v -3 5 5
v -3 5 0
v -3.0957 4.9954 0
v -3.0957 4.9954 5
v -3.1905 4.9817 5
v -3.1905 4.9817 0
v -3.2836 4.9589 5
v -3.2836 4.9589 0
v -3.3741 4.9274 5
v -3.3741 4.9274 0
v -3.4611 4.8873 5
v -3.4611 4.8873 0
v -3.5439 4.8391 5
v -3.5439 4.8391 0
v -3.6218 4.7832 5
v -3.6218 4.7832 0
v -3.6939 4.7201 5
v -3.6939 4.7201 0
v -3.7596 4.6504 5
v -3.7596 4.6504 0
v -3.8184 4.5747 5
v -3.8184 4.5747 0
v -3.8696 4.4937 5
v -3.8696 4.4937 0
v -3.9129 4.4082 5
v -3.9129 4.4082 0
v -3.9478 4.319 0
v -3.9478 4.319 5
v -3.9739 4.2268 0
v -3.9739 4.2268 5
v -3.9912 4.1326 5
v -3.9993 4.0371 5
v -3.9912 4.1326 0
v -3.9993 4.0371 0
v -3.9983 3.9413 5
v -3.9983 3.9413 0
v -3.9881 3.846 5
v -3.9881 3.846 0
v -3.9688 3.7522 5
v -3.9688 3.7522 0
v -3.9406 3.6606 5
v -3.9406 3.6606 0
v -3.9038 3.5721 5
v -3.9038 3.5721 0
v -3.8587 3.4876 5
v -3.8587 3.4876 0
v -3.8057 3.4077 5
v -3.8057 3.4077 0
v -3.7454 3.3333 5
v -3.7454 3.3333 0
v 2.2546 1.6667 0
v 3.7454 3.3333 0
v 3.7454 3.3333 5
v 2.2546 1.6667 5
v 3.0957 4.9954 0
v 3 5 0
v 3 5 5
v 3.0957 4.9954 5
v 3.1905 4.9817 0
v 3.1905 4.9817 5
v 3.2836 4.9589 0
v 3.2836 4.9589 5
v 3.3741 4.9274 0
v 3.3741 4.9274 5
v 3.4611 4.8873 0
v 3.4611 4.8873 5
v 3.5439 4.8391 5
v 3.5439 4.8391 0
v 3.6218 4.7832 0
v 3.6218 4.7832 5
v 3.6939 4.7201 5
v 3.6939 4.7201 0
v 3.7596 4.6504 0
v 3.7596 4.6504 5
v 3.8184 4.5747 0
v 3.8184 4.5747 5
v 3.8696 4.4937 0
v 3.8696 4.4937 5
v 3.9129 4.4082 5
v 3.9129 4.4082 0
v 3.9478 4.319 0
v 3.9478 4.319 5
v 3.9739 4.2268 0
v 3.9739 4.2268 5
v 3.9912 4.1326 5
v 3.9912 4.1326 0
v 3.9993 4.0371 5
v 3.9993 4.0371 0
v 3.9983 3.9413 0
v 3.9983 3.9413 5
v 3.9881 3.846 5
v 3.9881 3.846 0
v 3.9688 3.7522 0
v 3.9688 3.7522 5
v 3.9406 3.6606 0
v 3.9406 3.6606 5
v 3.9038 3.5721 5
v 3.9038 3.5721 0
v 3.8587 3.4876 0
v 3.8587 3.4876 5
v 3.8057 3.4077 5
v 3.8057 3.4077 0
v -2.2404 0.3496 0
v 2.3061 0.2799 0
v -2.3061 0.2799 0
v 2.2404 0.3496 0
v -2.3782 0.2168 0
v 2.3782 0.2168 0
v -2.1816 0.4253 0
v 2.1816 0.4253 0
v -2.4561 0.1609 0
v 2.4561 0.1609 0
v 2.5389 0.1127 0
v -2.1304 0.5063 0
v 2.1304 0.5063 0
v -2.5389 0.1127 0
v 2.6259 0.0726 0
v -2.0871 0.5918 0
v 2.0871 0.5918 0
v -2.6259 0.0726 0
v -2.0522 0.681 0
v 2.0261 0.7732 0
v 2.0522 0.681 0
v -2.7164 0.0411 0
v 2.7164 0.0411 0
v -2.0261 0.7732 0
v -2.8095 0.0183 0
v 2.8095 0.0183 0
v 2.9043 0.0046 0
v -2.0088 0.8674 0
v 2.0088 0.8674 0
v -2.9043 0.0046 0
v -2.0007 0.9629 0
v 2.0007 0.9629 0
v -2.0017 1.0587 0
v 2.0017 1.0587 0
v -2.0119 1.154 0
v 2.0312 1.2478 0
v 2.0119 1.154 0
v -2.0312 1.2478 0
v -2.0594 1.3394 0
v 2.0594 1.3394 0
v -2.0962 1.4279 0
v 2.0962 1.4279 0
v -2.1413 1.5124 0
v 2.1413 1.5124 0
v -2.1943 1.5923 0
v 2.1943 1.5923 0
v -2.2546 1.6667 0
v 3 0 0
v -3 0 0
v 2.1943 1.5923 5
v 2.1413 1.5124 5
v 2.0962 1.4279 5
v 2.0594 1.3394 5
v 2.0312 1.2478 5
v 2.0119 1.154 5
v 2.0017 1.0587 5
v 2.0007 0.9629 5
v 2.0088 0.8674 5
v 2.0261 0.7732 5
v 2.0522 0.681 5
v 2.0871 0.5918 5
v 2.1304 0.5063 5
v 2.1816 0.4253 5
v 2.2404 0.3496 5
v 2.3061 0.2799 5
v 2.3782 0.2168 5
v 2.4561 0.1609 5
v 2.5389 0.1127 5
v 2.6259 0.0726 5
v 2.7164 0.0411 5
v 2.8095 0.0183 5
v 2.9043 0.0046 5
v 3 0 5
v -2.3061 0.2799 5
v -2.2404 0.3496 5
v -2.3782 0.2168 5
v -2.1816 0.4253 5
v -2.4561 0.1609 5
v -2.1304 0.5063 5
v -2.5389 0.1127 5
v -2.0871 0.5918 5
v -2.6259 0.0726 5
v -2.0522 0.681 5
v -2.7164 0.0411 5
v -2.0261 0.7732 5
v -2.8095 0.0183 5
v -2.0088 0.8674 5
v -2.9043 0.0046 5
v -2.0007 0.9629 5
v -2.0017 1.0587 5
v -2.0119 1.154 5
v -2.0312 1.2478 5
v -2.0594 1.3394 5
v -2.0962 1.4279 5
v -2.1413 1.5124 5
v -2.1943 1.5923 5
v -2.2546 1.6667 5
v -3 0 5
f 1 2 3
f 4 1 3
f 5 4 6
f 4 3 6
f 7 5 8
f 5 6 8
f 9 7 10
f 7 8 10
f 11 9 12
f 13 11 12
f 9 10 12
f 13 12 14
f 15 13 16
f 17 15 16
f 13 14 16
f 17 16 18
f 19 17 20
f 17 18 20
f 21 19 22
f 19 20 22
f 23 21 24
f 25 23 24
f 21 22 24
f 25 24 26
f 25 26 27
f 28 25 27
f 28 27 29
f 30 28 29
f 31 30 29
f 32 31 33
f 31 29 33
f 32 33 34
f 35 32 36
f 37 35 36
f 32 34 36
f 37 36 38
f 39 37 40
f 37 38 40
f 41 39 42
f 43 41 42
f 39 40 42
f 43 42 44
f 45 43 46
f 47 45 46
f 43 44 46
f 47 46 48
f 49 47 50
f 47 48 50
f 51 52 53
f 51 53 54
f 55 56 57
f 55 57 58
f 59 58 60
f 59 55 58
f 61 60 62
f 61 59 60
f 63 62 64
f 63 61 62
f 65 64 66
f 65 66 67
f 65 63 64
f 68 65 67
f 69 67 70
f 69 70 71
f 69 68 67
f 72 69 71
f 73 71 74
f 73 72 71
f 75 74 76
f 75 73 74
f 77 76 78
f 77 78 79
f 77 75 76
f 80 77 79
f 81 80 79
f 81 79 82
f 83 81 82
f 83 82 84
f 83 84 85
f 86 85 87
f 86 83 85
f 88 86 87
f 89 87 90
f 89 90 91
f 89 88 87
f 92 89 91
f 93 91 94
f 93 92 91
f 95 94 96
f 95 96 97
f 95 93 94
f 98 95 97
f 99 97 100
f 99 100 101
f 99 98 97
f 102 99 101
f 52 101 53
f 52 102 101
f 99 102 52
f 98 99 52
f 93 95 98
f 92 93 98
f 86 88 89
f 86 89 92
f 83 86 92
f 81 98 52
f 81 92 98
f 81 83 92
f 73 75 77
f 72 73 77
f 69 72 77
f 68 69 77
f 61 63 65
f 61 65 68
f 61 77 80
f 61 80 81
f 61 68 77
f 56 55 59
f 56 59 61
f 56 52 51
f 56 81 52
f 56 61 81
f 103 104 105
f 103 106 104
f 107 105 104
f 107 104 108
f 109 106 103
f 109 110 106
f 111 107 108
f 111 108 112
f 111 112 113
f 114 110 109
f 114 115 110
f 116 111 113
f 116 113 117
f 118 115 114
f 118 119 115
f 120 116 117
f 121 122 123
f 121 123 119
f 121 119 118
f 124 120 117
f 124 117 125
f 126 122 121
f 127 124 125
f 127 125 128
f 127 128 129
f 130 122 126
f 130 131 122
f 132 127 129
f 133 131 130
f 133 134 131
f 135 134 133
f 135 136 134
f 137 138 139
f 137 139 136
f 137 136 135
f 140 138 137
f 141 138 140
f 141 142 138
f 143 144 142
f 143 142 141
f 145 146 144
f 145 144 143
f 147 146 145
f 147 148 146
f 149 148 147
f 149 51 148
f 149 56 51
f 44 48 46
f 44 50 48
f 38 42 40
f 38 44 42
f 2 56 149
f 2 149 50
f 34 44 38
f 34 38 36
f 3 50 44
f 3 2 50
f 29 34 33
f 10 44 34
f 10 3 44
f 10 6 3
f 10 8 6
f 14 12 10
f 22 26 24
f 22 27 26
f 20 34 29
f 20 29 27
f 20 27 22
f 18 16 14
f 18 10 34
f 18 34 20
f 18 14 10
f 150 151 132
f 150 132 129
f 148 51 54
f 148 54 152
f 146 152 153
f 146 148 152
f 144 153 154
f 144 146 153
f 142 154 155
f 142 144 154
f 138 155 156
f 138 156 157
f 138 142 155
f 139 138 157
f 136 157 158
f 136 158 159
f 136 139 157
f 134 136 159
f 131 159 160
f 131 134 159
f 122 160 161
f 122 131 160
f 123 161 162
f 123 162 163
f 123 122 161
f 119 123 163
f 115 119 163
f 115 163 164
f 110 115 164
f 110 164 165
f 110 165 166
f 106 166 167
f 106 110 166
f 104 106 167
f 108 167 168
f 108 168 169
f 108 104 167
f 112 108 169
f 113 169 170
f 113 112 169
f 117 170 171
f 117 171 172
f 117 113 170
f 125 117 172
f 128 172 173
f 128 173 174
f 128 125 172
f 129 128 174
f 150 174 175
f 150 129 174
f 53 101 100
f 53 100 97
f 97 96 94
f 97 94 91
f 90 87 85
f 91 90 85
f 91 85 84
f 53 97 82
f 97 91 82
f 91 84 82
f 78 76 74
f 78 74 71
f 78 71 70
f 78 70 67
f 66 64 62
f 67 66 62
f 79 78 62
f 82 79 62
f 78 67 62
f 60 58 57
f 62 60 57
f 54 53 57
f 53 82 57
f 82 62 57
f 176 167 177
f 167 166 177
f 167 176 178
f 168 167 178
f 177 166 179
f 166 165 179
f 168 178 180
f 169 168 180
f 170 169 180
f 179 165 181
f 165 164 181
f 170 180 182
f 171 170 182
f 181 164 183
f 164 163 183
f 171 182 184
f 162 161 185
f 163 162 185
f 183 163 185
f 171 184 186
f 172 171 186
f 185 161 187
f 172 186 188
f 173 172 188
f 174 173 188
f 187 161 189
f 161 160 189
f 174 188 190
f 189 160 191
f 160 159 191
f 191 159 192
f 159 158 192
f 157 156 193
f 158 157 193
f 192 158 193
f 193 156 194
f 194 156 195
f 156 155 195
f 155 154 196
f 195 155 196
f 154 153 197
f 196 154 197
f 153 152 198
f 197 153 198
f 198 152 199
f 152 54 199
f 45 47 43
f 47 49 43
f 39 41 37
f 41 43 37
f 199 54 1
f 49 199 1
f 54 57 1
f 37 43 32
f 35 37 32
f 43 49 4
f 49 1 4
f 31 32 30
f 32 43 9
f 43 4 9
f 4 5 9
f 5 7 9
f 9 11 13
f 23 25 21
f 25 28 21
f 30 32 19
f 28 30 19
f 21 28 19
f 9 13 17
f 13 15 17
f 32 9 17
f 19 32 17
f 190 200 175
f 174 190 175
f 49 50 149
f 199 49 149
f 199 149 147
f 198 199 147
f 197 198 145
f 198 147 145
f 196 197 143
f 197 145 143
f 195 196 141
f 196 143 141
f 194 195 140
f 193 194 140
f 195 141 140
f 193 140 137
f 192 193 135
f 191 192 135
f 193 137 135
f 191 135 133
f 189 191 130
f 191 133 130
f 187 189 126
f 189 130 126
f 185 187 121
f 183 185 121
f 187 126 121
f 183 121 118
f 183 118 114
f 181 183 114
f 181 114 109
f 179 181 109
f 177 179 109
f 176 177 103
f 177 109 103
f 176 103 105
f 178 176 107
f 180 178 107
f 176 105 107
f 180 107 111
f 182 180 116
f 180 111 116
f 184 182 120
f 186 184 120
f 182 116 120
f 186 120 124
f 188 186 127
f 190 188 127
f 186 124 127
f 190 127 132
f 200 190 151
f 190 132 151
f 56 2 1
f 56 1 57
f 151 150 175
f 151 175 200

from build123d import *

# Parameters (mm, degrees)
F1_DEPTH = 5


with BuildPart() as f1:
    # F0 (on Top) → F1 (new body)
    with BuildSketch(Plane.XY):
        with BuildLine():
            Line((0, 5), (-3, 5))
            ThreePointArc((-3, 5), (-3.912871, 4.408248), (-3.745356, 3.333333))
            Line((-3.745356, 3.333333), (-2.254644, 1.666667))
            ThreePointArc((-2.254644, 1.666667), (-2.087129, 0.591752), (-3, 0))
            Line((-3, 0), (0, 0))
            Line((0, 0), (0, 5))
        make_face()
    extrude(amount=F1_DEPTH)

    # F2: F1 across face


with BuildPart() as f1_1:
    add(f1.part)
    add(f1.part.mirror(Plane(origin=(0, 2.5, 2.5), x_dir=(0, 1, 0), z_dir=(1, 0, 0))))


solid = f1_1.part
